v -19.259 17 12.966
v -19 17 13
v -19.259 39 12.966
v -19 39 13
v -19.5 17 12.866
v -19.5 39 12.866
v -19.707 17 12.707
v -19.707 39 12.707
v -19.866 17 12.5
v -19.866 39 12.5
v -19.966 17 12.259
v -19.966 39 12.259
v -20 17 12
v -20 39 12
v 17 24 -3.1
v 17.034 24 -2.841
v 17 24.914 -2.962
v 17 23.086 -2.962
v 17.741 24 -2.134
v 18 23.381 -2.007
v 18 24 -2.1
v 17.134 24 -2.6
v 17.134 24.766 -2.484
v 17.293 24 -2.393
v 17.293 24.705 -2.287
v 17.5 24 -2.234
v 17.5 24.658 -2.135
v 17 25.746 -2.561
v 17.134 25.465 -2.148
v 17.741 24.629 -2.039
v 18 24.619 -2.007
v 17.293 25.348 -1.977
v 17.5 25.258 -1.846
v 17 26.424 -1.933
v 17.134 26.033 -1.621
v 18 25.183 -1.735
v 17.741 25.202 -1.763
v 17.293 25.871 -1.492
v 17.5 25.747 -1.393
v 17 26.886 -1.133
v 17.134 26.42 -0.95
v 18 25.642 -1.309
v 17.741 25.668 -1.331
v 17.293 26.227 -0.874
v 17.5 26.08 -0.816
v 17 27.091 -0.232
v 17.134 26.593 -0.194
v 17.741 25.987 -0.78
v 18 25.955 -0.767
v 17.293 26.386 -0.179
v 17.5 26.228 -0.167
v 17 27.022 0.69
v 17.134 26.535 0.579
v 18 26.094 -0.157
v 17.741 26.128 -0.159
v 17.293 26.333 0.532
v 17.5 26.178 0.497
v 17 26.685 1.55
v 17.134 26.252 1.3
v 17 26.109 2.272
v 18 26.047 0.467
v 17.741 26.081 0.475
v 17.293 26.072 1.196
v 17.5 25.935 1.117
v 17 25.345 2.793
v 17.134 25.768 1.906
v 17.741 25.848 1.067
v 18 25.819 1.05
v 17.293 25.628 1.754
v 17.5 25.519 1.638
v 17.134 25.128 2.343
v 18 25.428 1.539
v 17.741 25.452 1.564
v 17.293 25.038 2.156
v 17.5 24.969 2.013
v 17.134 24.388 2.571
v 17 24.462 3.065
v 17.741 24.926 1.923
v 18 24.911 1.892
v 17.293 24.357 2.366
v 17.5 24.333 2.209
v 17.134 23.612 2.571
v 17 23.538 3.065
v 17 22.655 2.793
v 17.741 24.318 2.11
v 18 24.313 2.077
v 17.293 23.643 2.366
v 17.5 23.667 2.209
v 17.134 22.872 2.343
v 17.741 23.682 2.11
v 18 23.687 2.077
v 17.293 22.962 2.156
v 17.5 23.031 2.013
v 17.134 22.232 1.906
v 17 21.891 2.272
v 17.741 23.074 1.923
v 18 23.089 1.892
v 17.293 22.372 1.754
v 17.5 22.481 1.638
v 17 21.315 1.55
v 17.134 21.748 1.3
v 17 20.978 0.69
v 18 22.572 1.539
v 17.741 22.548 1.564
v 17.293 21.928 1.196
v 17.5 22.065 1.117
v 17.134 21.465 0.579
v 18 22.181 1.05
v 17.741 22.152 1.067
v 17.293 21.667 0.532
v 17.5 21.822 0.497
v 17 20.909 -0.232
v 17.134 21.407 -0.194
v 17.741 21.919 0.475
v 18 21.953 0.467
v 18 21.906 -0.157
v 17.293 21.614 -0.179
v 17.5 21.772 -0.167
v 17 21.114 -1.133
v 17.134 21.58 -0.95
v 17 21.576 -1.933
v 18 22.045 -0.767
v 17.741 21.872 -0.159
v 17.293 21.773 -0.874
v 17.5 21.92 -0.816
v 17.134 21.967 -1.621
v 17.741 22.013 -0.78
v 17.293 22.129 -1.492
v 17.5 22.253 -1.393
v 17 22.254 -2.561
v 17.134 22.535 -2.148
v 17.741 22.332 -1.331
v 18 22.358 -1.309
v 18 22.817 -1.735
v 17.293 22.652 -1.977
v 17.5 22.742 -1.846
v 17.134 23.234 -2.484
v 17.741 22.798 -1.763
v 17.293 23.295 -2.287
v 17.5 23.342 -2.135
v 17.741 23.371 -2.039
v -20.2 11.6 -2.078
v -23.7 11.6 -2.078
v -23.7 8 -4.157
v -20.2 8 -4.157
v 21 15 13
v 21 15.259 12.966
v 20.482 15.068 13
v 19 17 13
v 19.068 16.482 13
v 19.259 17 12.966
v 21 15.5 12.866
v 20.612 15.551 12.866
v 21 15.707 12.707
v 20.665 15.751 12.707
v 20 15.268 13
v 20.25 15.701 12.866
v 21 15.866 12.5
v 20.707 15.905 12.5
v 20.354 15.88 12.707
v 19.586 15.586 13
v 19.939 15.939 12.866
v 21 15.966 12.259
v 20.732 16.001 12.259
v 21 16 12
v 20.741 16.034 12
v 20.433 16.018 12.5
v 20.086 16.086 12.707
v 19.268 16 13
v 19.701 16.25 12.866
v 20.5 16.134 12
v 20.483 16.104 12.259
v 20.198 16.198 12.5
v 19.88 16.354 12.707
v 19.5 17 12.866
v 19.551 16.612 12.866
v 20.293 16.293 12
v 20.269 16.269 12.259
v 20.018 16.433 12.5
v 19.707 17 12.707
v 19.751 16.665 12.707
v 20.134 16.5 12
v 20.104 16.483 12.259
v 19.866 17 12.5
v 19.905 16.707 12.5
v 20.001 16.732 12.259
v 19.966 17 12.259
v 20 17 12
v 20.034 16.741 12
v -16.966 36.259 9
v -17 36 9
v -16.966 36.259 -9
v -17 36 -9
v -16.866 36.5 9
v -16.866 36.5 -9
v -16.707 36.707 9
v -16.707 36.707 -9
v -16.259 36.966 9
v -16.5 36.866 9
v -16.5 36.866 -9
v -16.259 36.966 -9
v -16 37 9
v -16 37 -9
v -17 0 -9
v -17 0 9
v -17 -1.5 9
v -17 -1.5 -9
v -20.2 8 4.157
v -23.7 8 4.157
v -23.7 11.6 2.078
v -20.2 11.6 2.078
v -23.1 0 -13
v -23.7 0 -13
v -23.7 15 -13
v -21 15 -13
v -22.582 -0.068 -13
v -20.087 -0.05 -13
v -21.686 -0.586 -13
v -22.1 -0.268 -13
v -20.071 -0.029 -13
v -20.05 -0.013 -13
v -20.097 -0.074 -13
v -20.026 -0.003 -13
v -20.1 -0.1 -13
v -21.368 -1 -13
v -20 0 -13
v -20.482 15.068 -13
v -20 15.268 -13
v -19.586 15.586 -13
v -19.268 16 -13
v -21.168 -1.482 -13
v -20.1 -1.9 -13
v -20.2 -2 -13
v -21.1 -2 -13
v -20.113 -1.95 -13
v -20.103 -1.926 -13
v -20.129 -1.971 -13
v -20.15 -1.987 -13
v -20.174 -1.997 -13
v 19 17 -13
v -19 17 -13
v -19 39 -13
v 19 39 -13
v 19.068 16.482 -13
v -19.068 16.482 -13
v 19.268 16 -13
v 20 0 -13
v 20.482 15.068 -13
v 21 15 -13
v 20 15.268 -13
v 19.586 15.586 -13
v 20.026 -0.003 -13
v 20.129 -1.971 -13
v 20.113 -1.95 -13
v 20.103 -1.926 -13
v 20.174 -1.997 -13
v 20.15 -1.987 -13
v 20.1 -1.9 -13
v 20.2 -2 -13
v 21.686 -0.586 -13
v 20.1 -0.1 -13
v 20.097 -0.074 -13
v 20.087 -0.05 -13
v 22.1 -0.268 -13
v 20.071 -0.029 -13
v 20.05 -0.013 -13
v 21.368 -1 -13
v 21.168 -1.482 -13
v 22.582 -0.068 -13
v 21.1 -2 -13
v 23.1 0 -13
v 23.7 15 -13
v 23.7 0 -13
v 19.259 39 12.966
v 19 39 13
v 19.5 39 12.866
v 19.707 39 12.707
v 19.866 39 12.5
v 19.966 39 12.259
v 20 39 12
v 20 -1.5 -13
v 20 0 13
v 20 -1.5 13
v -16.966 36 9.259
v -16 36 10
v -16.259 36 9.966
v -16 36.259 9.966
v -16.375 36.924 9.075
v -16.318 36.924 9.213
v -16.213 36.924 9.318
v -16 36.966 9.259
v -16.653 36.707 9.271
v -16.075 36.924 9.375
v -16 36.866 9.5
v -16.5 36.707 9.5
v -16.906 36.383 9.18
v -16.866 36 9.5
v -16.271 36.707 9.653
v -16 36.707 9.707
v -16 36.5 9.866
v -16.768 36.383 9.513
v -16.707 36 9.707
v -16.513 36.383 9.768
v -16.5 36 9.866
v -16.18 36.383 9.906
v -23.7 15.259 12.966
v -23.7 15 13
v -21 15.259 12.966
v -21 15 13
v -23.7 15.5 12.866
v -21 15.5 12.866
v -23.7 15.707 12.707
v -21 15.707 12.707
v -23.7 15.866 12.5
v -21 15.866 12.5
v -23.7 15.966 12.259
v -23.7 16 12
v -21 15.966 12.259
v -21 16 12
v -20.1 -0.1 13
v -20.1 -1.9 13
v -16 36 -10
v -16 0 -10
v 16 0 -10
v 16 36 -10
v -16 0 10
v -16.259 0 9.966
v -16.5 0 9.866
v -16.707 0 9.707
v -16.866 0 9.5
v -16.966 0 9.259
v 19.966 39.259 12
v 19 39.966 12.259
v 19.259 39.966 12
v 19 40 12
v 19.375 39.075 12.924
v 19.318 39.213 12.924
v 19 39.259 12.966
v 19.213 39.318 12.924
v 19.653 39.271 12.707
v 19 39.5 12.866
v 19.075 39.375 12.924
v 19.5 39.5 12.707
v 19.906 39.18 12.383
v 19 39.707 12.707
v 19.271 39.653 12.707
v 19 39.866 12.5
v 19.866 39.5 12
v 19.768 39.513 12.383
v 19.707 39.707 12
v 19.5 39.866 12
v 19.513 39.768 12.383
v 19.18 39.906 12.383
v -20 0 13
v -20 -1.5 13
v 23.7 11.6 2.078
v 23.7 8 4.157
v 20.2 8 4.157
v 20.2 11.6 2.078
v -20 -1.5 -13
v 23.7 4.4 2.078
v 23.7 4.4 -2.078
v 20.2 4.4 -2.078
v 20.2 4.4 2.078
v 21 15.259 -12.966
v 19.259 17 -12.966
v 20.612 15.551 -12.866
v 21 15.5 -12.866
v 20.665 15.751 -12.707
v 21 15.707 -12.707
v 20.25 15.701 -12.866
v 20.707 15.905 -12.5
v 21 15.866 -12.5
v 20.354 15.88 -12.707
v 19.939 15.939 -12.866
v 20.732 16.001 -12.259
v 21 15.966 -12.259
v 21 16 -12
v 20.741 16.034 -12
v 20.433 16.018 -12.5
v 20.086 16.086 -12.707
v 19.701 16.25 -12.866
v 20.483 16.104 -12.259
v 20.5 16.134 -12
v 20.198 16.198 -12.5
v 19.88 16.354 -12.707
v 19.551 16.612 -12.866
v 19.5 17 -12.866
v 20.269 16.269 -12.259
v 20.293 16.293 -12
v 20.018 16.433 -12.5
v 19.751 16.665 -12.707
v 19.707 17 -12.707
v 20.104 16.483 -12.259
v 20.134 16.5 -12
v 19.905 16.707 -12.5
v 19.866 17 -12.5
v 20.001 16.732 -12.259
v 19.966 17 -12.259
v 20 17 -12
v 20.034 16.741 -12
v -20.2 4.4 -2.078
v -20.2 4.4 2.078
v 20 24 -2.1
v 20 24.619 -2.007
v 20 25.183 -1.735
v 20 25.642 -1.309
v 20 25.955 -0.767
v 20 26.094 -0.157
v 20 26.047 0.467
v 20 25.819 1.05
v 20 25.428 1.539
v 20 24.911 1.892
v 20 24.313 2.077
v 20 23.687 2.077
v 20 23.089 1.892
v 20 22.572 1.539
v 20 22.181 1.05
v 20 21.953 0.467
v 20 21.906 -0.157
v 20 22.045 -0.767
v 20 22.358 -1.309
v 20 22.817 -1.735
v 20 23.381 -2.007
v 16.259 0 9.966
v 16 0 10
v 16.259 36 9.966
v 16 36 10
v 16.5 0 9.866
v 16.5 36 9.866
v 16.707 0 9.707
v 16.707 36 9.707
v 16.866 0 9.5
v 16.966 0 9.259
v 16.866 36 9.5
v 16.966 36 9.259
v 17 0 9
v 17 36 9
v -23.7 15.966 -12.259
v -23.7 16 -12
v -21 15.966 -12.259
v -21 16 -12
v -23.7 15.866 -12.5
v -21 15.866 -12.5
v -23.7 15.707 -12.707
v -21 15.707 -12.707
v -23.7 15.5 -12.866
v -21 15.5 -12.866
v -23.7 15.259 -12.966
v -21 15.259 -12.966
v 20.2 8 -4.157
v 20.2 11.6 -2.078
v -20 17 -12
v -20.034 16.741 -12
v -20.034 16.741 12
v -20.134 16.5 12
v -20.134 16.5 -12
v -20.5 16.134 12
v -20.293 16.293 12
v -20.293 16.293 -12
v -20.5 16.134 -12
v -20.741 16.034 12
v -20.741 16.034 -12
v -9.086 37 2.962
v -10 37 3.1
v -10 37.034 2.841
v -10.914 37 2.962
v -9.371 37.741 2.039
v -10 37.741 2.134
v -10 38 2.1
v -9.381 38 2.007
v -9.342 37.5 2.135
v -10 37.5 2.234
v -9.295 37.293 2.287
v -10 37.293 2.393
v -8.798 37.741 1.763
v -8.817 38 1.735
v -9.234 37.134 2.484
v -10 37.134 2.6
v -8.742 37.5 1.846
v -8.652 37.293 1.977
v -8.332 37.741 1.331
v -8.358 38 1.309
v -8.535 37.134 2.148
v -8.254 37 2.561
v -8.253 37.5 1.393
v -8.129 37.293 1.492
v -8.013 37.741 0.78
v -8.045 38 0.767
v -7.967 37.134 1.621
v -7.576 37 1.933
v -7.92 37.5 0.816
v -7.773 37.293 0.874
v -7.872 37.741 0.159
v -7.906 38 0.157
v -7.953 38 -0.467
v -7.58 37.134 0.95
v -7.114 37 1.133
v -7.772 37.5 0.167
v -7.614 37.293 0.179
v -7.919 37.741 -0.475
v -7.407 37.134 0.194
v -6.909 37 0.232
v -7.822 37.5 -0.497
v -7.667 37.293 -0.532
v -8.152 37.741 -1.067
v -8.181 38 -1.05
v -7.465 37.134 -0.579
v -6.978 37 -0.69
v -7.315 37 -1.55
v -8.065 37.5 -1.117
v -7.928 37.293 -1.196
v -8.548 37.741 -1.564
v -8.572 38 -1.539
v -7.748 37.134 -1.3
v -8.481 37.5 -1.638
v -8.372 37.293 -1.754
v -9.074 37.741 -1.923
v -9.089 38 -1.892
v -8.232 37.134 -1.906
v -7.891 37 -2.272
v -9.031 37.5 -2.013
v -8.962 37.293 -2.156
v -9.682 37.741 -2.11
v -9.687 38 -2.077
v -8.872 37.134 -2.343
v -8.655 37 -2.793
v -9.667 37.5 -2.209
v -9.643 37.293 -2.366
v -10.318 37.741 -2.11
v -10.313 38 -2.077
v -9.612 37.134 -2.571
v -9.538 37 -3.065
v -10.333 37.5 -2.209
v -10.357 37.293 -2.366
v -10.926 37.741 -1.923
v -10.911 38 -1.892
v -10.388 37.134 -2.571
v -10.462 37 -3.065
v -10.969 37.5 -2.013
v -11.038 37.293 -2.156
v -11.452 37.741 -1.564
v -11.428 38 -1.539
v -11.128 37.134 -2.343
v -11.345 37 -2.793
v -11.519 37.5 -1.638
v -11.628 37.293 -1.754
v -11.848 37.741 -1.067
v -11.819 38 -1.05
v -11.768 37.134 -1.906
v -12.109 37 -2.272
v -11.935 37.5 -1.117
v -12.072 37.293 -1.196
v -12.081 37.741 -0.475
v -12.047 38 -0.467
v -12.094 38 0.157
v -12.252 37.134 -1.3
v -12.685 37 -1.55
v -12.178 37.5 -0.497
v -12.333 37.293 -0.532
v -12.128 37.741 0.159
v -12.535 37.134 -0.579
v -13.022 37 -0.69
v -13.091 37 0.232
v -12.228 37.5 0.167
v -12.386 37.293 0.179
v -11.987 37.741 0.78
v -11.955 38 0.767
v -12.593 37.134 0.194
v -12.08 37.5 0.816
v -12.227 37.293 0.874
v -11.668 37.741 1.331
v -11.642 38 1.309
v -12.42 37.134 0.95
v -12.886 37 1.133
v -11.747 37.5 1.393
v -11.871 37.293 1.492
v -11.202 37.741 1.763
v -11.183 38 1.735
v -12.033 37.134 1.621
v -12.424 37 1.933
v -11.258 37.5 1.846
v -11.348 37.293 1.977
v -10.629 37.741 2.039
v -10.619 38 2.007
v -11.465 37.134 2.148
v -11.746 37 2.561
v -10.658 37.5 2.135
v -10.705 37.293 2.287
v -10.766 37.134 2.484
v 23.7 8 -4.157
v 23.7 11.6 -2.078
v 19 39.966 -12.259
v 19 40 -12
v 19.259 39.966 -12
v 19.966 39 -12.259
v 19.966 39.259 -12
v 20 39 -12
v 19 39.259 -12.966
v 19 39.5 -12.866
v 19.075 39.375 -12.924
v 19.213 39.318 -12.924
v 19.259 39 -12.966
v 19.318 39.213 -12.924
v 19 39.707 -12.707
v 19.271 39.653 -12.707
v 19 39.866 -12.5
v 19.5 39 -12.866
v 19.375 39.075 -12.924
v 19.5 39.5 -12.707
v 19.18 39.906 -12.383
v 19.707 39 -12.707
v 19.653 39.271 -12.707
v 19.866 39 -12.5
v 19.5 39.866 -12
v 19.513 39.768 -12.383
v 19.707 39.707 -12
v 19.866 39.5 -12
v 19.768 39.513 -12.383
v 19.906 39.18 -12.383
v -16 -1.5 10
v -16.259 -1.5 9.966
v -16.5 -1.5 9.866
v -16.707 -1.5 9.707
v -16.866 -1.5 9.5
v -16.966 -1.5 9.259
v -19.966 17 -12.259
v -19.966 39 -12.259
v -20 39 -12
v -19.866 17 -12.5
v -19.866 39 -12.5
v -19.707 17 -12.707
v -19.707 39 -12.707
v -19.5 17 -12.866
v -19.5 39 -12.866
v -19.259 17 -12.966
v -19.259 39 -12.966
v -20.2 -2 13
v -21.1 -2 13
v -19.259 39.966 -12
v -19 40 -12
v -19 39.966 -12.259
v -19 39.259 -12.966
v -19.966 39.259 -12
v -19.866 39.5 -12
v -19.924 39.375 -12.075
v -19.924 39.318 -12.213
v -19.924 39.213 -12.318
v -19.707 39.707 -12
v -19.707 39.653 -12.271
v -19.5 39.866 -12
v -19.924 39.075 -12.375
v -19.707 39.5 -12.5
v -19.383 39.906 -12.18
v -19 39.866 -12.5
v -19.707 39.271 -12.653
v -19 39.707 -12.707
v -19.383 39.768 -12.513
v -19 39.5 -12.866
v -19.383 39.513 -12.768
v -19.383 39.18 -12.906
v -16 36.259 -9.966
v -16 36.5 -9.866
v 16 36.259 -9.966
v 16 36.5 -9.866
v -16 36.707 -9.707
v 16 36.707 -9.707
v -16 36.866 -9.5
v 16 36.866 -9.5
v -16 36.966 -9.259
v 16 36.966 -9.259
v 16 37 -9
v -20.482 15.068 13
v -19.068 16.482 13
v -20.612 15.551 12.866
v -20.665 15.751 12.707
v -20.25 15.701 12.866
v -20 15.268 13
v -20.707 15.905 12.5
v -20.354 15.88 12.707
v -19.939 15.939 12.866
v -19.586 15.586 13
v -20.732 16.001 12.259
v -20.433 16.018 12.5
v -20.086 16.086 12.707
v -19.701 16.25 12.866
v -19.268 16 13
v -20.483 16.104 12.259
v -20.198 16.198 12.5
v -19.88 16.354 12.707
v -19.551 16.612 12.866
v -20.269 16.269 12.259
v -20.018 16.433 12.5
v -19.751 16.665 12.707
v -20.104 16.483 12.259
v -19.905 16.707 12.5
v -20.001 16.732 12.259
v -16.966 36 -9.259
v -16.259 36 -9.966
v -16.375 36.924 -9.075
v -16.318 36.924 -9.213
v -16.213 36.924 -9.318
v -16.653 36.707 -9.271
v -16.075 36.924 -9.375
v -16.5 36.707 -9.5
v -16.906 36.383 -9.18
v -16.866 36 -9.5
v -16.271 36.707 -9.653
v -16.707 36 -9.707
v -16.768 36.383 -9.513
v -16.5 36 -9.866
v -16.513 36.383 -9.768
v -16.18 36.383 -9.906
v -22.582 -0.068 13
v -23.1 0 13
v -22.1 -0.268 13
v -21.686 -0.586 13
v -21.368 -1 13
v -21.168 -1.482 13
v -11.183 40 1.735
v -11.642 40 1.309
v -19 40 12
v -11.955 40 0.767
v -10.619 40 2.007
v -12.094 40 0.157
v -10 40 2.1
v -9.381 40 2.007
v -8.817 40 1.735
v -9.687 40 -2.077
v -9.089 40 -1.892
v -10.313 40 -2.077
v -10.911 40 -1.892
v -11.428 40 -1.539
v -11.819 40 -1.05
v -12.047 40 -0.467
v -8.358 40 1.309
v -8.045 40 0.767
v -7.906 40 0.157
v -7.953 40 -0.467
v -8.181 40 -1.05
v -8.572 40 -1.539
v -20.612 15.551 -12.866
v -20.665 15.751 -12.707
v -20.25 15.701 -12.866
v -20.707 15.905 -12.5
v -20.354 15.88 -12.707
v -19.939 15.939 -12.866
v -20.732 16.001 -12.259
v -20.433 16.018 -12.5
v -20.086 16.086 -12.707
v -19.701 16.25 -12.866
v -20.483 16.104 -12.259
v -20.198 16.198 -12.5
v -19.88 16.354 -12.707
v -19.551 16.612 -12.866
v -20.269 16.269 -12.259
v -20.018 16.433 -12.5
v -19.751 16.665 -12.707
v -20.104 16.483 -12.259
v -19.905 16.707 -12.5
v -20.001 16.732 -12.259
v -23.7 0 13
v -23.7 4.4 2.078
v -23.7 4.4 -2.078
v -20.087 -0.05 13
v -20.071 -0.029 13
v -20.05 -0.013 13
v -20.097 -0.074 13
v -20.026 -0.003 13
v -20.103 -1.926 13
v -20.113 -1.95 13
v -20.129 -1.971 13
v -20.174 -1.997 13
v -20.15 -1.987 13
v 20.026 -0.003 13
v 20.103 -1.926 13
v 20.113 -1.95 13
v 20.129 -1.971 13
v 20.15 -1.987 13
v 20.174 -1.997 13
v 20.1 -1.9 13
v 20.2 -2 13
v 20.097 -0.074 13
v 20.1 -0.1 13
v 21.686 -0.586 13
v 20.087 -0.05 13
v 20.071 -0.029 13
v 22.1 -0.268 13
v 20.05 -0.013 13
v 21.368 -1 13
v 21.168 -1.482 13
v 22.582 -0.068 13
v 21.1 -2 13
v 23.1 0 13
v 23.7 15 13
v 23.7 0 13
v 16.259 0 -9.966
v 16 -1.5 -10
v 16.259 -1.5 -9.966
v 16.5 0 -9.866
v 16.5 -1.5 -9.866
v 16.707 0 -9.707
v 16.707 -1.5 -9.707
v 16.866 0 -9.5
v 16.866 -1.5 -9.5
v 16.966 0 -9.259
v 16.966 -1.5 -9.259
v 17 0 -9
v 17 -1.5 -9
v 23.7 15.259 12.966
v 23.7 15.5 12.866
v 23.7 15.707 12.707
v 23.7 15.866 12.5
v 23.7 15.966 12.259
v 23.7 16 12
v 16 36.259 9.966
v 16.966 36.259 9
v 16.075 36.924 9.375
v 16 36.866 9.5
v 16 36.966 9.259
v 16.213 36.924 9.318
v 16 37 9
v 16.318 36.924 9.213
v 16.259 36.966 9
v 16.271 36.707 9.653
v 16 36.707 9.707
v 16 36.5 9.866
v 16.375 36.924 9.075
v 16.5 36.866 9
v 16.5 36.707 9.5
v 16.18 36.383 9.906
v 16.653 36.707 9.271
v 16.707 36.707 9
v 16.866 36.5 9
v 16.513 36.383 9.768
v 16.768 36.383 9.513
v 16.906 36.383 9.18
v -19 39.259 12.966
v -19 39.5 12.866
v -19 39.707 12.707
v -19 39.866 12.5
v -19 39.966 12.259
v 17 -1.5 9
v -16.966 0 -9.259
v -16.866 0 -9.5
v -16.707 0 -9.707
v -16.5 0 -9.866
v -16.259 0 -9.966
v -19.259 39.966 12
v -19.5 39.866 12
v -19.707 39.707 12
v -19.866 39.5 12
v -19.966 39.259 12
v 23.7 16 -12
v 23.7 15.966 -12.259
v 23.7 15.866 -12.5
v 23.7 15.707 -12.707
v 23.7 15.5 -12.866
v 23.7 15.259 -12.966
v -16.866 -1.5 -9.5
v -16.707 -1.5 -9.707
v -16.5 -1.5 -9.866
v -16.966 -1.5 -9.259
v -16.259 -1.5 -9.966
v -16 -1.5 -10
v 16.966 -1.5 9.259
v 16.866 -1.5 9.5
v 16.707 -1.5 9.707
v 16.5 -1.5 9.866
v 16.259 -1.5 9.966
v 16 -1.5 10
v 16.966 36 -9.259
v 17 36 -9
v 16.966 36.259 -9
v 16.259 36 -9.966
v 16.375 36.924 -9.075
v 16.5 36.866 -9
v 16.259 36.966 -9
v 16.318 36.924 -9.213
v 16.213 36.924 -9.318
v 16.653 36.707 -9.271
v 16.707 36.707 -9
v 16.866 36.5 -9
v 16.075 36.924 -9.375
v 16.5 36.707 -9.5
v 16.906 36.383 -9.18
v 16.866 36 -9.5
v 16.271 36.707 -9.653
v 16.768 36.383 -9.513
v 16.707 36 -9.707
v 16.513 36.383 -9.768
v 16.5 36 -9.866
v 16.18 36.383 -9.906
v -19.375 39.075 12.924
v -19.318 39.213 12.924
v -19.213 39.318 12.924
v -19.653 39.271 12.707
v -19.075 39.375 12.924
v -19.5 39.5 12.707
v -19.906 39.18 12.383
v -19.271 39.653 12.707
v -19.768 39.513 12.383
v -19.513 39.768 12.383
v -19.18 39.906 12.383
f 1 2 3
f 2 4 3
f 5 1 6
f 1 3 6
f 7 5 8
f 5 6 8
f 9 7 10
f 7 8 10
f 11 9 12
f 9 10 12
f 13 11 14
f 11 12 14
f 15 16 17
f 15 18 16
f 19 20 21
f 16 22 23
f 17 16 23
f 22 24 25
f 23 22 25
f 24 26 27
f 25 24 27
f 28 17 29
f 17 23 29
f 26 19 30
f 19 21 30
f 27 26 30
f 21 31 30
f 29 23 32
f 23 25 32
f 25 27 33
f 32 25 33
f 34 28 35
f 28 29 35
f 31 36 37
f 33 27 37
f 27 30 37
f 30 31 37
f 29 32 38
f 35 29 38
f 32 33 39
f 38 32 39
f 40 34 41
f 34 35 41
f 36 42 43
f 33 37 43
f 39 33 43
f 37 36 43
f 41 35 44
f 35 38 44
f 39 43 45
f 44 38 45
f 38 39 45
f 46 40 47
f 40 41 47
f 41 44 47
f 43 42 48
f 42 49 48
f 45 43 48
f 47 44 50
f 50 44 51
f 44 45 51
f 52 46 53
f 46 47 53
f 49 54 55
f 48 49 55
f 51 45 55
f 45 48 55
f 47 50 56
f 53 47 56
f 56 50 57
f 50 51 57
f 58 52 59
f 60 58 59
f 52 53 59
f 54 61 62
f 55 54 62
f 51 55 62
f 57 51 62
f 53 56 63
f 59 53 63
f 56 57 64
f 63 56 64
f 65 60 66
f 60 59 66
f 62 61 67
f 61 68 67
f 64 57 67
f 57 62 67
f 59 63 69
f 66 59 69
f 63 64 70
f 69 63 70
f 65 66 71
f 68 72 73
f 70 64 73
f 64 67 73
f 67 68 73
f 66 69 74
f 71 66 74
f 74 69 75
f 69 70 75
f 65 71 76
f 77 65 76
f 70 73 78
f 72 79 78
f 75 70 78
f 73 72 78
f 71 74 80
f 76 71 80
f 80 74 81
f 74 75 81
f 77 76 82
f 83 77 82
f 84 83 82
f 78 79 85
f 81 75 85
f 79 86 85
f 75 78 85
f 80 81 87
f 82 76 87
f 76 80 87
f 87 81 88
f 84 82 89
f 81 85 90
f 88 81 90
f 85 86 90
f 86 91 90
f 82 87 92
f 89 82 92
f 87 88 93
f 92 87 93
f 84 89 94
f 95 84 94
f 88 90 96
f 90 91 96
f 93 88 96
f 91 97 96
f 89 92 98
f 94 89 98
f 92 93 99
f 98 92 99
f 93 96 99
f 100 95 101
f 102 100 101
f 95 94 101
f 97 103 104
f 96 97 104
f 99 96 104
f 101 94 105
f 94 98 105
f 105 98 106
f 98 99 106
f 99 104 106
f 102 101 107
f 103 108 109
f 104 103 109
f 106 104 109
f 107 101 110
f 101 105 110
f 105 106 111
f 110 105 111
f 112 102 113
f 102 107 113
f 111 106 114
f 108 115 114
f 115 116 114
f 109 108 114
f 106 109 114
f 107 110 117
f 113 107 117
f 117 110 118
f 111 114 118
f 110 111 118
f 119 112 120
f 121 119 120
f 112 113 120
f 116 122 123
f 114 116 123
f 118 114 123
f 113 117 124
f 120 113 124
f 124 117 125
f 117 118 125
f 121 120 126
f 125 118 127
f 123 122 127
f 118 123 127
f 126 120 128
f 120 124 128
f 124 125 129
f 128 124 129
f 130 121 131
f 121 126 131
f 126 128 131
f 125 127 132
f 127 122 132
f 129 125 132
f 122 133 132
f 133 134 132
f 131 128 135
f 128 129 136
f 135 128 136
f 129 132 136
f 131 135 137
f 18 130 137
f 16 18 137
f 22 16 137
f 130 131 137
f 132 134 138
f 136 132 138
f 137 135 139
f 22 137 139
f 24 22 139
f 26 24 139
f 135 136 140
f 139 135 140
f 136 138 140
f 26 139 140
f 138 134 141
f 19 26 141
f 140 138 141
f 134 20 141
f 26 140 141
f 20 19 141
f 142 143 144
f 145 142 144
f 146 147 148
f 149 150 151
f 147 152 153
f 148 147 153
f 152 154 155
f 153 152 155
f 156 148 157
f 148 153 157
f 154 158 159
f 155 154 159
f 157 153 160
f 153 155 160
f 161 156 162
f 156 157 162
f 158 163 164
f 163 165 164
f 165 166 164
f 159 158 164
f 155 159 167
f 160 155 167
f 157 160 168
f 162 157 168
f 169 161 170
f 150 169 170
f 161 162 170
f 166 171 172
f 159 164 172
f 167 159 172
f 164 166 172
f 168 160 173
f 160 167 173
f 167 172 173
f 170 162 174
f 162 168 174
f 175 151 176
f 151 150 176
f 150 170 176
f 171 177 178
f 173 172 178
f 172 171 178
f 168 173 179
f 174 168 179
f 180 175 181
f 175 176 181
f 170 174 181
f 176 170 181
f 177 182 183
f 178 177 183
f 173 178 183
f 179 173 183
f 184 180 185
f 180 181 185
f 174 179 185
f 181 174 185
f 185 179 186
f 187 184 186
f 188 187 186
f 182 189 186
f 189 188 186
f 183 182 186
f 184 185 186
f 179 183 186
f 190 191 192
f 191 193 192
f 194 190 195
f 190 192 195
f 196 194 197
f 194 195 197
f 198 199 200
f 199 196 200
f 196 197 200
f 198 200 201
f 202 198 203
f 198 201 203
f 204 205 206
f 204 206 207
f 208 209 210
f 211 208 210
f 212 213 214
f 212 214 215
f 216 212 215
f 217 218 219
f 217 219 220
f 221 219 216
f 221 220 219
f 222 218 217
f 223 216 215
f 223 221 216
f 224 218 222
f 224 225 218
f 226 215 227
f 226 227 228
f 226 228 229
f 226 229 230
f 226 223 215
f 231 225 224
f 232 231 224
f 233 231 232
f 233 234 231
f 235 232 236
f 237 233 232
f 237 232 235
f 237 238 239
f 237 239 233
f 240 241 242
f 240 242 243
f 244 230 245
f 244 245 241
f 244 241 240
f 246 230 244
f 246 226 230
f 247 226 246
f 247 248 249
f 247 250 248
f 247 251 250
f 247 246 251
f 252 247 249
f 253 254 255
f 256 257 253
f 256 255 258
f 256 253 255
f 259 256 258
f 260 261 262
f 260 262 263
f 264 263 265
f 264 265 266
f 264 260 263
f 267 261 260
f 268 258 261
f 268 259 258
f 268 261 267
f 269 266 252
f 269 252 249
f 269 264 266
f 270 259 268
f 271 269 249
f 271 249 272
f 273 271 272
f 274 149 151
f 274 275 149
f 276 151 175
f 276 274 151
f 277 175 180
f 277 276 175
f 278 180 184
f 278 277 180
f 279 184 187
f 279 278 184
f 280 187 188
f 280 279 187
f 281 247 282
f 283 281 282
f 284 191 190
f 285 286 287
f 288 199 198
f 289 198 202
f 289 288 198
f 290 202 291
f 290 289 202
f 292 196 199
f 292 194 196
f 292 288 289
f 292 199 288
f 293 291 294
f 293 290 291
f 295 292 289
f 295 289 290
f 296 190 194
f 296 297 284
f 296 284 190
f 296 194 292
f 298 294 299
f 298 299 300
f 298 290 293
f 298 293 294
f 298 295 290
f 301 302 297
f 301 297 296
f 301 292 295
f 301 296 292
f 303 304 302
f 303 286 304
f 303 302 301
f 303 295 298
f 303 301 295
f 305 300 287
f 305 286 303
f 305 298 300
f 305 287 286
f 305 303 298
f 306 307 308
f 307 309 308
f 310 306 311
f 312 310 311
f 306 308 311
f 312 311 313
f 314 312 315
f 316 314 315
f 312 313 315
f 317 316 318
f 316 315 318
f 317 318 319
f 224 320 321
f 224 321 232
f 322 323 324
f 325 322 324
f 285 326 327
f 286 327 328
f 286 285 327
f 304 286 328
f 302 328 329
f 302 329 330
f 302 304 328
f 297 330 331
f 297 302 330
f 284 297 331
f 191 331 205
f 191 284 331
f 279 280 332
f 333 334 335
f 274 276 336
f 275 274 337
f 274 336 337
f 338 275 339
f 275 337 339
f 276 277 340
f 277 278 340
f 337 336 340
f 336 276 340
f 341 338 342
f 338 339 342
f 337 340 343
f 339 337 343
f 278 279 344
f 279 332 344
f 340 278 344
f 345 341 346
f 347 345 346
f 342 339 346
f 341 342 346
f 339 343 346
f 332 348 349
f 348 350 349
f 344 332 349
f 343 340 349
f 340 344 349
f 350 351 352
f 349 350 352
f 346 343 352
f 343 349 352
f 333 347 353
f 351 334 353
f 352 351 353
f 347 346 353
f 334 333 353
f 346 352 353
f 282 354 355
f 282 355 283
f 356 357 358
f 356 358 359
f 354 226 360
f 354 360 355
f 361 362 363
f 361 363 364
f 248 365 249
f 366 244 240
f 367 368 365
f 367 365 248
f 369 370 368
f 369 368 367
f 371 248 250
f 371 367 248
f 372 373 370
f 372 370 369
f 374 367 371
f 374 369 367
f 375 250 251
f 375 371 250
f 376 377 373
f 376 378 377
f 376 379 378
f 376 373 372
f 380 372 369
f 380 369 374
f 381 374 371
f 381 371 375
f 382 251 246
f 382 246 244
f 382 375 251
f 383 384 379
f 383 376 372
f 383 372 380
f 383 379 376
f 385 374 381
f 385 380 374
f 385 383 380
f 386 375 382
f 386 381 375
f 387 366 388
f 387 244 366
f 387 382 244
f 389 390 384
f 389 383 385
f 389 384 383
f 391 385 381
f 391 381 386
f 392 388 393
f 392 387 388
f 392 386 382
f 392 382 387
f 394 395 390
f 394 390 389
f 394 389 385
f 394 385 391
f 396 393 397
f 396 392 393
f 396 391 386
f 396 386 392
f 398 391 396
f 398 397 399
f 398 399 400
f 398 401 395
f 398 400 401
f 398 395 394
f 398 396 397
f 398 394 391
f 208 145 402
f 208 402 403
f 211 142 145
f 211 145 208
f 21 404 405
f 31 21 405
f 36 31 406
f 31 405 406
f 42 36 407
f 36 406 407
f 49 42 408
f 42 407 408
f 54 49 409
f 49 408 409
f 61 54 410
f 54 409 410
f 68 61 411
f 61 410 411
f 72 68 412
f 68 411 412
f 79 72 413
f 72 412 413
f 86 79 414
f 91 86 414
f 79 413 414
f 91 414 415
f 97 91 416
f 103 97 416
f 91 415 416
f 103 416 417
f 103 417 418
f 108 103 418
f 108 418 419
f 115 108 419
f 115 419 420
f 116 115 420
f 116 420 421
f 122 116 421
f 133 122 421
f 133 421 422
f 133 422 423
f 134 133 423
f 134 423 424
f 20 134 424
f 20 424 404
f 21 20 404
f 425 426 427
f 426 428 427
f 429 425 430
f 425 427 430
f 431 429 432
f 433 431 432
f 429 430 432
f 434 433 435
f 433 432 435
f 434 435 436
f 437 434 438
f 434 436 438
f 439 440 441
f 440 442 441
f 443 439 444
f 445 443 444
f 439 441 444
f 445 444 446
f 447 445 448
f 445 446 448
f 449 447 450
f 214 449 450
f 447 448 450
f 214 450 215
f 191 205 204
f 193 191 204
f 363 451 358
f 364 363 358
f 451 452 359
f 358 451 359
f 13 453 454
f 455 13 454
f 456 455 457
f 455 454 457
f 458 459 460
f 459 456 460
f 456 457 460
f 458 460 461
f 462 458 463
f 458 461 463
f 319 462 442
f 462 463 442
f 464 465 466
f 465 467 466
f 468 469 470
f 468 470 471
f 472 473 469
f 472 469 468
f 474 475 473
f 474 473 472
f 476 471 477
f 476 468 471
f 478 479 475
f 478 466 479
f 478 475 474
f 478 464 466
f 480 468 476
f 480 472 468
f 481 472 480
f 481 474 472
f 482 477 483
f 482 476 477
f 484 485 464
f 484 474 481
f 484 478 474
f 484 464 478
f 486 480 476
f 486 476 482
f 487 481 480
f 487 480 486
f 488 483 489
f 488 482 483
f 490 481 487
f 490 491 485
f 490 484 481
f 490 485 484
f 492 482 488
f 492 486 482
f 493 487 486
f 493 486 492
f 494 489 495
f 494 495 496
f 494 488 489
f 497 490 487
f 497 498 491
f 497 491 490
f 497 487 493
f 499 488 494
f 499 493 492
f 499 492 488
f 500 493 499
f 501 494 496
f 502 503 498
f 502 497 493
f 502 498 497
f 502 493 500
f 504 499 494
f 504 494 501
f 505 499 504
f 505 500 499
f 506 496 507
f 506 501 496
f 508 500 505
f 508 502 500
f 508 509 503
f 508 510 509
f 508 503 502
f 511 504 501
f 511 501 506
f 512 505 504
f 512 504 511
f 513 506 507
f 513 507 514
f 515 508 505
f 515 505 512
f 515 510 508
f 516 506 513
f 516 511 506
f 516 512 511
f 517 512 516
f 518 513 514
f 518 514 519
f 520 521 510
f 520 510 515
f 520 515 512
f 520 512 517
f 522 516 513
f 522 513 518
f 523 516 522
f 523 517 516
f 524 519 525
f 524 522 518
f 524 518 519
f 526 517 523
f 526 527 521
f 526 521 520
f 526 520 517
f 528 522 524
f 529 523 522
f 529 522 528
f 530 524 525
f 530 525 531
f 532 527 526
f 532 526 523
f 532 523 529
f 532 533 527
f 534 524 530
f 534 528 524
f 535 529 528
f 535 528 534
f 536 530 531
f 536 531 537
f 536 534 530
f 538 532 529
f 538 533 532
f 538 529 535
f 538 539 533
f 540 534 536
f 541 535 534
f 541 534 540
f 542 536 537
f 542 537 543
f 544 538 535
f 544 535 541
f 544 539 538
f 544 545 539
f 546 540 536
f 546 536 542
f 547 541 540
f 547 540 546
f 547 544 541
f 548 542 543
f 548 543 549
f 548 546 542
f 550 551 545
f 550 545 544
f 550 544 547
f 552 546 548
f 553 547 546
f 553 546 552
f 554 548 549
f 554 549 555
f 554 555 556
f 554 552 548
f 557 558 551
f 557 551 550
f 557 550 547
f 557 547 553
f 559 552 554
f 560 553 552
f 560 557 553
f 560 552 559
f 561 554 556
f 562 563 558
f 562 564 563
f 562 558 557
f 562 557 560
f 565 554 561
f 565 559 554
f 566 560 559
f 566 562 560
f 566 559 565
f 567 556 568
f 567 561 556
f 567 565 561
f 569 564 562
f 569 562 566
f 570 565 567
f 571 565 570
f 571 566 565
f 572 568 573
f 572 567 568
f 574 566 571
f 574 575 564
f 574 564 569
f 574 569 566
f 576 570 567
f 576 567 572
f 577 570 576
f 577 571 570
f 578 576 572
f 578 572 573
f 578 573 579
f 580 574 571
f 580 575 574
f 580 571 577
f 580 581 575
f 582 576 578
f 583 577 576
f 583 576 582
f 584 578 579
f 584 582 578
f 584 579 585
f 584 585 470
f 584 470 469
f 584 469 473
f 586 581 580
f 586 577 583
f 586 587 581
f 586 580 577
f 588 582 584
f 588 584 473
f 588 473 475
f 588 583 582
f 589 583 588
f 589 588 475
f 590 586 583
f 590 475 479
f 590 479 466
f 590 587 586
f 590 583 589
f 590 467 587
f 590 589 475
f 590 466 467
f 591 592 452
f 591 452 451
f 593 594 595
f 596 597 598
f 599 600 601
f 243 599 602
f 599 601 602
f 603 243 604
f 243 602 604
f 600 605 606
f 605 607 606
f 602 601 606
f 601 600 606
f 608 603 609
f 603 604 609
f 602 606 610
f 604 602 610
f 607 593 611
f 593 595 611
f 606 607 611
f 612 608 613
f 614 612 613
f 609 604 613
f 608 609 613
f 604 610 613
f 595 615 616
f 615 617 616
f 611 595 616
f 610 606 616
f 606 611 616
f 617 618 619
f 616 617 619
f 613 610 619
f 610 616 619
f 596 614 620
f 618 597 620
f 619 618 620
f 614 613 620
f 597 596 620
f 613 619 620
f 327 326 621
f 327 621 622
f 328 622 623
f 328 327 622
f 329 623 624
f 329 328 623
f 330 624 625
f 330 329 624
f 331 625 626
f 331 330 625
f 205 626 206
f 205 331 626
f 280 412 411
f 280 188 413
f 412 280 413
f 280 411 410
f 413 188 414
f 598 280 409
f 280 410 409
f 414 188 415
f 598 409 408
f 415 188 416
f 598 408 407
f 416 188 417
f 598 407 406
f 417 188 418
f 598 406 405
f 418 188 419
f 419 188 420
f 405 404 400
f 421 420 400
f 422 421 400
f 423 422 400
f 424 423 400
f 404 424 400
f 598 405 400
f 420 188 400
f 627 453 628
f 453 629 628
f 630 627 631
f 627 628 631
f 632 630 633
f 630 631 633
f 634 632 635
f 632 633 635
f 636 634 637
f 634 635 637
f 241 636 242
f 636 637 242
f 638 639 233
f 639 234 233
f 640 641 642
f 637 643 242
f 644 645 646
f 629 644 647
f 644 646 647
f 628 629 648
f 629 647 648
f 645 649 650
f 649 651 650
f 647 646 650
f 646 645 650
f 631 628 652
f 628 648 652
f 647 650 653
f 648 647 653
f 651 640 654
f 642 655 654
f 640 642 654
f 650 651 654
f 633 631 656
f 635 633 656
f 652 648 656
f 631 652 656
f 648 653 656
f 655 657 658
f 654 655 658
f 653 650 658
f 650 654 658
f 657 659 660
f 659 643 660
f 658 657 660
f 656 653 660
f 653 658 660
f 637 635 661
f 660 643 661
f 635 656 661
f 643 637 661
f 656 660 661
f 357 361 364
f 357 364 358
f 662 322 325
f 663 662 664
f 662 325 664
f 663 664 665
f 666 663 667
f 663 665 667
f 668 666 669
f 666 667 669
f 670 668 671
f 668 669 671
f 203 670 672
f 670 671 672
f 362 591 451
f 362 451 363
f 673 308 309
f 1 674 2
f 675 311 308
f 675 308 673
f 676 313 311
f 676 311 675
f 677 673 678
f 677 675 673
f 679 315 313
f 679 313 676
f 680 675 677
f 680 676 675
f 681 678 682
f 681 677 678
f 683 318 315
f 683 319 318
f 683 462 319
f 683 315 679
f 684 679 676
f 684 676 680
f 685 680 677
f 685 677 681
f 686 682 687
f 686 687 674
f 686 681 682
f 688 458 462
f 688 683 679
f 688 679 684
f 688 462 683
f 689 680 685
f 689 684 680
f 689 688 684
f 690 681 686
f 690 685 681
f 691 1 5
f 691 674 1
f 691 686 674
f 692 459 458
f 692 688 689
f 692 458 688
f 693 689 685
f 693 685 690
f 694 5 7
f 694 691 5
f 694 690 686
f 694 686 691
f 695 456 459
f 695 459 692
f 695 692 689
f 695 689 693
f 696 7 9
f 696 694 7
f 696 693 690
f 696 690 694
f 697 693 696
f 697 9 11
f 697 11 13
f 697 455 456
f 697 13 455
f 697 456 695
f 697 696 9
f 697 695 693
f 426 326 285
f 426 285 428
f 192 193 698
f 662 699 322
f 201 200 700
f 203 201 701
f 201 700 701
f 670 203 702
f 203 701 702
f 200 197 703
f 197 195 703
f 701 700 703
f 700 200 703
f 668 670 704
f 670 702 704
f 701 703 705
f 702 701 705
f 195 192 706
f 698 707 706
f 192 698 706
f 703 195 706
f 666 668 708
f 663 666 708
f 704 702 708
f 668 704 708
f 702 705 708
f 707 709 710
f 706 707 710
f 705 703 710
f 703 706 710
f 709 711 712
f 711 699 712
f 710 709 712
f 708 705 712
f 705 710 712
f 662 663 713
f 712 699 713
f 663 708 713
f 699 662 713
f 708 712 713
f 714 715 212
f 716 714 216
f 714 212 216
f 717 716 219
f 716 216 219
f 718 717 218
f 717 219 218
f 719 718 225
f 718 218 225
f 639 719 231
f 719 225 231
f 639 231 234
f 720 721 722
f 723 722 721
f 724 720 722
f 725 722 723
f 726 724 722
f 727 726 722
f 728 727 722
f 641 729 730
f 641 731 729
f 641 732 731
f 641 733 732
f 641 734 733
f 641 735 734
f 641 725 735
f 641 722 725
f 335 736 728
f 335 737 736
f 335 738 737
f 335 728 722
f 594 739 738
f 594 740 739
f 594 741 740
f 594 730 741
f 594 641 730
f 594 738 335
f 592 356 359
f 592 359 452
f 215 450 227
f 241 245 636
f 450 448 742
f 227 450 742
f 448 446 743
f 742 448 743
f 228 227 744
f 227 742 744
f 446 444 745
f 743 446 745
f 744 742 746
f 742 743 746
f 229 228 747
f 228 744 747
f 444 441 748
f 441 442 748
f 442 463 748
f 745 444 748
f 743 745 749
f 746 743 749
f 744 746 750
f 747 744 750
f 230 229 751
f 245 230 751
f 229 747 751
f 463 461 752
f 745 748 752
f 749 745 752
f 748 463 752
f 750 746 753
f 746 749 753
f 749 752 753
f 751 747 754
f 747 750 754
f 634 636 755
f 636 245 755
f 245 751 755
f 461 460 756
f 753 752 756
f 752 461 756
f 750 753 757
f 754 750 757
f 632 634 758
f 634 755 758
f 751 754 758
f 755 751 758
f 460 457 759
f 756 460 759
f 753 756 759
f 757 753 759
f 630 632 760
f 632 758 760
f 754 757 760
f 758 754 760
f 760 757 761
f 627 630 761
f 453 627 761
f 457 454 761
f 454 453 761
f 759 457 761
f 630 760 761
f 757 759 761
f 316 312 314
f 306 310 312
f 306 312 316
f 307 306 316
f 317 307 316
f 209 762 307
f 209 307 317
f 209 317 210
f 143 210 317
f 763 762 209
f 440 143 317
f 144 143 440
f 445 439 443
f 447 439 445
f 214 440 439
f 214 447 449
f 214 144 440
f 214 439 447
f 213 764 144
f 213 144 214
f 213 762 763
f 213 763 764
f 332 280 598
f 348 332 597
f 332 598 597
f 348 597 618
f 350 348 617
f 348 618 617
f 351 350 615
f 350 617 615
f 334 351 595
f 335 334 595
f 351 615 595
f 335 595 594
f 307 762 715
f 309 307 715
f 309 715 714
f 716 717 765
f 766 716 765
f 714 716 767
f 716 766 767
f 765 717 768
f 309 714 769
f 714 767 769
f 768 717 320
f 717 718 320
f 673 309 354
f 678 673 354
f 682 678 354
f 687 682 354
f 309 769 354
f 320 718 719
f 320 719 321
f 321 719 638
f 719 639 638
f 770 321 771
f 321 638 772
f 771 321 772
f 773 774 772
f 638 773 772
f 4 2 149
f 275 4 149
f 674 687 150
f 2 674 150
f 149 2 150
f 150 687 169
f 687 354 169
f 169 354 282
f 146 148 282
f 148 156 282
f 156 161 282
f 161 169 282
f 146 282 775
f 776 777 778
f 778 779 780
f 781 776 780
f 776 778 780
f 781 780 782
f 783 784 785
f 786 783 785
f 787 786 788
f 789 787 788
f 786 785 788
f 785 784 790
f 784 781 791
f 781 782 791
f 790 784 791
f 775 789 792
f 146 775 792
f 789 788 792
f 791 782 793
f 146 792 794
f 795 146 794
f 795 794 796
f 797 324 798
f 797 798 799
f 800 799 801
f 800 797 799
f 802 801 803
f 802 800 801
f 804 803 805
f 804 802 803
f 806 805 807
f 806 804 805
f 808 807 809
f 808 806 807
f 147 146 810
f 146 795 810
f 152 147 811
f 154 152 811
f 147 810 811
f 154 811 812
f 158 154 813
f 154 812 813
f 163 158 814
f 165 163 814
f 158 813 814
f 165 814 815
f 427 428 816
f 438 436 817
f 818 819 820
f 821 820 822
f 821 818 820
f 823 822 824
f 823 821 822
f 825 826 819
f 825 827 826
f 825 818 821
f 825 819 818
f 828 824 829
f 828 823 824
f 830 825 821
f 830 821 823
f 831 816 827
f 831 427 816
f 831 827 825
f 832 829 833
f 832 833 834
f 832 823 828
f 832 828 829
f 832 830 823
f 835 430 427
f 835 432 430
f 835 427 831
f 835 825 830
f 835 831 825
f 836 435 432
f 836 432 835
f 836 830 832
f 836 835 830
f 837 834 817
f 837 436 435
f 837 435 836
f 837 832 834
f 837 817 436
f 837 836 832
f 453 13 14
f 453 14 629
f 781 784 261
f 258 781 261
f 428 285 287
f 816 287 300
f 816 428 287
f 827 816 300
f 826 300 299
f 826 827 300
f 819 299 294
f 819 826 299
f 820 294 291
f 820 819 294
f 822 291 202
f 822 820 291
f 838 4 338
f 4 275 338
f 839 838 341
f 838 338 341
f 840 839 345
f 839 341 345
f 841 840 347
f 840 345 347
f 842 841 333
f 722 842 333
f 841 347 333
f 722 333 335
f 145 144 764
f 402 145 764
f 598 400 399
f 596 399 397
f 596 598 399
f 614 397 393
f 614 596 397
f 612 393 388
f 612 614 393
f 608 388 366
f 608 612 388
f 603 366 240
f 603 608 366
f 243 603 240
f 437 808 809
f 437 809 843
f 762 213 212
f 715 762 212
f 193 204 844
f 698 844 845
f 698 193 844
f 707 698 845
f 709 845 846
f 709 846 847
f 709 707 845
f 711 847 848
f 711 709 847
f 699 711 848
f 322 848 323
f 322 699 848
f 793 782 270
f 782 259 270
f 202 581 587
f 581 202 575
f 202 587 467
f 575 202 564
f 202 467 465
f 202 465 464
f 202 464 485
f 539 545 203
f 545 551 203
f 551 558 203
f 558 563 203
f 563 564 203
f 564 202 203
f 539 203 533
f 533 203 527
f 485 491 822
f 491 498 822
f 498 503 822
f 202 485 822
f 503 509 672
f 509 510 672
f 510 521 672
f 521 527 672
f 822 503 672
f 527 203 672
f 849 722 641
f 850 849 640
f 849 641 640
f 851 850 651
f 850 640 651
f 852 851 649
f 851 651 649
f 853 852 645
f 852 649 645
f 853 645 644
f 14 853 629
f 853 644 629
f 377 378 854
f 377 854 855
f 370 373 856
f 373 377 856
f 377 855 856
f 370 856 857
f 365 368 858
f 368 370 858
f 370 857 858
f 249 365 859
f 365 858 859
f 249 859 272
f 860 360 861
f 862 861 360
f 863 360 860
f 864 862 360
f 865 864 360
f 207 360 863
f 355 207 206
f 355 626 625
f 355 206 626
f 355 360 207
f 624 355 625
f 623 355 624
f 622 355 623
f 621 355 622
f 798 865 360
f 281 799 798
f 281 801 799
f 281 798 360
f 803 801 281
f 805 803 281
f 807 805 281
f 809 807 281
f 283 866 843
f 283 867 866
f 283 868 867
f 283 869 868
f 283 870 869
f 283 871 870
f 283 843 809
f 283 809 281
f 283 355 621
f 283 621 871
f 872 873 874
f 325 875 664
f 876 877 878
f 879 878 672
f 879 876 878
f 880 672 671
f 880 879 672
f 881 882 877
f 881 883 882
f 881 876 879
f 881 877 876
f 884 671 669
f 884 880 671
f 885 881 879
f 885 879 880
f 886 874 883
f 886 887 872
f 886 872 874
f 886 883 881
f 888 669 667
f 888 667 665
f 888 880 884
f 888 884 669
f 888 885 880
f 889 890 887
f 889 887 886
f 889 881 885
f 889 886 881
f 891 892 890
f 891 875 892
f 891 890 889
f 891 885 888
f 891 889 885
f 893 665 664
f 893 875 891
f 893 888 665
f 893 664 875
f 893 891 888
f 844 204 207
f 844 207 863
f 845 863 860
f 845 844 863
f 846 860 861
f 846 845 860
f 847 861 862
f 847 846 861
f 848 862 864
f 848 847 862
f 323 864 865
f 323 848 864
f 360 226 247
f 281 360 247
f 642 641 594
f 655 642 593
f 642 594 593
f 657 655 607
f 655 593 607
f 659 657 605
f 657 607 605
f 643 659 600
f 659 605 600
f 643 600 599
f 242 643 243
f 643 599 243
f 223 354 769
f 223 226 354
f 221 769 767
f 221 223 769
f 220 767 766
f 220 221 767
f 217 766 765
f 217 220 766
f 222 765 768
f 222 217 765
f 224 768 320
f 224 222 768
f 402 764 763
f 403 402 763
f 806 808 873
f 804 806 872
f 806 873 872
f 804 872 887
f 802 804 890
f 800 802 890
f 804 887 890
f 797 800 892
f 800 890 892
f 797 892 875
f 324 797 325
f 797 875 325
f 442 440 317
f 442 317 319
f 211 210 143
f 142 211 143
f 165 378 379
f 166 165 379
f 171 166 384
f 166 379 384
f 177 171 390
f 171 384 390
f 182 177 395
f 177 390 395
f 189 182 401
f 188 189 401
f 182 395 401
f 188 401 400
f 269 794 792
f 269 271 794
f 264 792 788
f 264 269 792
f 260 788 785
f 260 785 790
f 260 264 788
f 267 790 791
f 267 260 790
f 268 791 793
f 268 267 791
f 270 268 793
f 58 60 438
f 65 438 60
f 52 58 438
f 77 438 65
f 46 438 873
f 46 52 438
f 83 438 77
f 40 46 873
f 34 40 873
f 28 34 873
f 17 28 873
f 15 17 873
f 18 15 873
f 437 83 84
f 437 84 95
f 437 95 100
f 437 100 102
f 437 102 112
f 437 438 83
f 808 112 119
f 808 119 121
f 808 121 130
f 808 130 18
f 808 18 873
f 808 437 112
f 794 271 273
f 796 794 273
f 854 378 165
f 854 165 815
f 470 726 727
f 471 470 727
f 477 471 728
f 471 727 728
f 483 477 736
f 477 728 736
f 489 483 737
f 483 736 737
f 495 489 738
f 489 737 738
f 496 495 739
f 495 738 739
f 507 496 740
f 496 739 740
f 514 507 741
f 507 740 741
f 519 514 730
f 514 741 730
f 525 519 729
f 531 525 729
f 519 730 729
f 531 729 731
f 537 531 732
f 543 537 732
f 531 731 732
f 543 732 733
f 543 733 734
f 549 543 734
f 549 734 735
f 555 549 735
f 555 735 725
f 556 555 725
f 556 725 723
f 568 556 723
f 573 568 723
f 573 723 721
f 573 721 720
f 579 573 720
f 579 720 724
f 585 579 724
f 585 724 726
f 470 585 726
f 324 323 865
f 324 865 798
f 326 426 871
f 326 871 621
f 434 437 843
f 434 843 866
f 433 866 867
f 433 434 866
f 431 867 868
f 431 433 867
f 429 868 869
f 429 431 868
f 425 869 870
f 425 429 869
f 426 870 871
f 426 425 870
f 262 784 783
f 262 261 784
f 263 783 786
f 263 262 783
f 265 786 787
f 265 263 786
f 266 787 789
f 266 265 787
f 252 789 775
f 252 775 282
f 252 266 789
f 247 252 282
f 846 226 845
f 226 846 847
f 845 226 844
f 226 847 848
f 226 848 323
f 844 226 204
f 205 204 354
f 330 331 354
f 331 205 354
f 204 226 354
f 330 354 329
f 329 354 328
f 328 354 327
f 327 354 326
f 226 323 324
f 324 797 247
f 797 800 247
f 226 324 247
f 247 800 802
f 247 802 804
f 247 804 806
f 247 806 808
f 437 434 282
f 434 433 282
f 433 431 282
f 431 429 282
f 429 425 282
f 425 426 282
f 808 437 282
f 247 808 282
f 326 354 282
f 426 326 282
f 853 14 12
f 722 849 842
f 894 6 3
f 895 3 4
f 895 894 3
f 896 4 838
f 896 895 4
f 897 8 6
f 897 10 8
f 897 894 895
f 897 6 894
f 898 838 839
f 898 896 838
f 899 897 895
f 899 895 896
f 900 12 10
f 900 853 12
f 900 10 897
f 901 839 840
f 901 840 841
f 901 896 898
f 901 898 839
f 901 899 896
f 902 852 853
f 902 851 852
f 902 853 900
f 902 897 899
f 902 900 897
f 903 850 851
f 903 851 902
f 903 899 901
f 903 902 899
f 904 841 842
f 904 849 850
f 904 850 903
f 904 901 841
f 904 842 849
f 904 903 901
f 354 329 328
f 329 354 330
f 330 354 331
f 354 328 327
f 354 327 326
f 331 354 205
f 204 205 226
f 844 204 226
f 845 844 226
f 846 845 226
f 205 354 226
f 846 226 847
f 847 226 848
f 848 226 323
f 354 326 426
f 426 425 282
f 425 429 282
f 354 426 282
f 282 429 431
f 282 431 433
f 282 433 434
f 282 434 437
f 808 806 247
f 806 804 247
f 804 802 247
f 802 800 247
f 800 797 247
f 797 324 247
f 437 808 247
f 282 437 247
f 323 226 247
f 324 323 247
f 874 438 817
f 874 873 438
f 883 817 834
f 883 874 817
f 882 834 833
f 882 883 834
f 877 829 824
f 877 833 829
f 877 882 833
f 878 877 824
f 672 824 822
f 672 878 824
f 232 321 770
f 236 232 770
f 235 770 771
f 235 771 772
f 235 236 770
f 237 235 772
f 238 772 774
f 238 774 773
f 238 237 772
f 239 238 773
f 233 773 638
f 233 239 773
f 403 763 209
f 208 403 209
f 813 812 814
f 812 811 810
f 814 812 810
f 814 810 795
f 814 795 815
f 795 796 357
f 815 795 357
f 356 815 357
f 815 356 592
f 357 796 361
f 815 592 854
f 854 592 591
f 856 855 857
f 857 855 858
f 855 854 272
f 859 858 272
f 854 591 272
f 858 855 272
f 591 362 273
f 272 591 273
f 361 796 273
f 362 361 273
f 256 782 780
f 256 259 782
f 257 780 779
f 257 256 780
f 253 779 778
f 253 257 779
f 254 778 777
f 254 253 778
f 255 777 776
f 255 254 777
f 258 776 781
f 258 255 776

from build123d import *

# Parameters (mm, degrees)
SKETCH1_W               = 40
SKETCH1_H               = 26
BODY_DEPTH              = 40
SKETCH2_W               = 3.7
SKETCH2_H               = 26
EXTENSION_DEPTH         = 16
SKETCH5_W               = 34
SKETCH5_H               = 20
CAVITY_DEPTH            = 37
TOP_HOLE_REACH          = 50.277
SKETCH6_R               = 2.1
SIDE_HOLE_REACH         = 62.652
SKETCH7_R               = 2.1
SKETCH3_W               = 1
SKETCH3_H               = 26
LEGS_DEPTH              = 2
MOUNT_COUNTERBORE_DEPTH = 3.5
F_2MM_LEG_FILLET_R      = 2
F_0_1MM_LEG_FILLET_R    = 0.1
OUTER_BOUNDARY_FILLET_R = 1
INNER_BOUNDARY_FILLET_R = 1
SKETCH8_W               = 40
SKETCH8_H               = 26
BOSS_EXTRUDE1_DEPTH     = 1.5


with BuildPart() as part:
    # Sketch1 → Body (new body)
    with BuildSketch(Plane(origin=(0, 0, 0), x_dir=(1, 0, 0), z_dir=(0, 1, 0))):
        Rectangle(SKETCH1_W, SKETCH1_H)
    extrude(amount=BODY_DEPTH)

    # Sketch2 → Extension (add)
    with BuildSketch(Plane(origin=(0, 0, 0), x_dir=(1, 0, 0), z_dir=(0, 1, 0))):
        with Locations((-21.85, 0)):
            Rectangle(SKETCH2_W, SKETCH2_H)
        with Locations((21.85, 0)):
            Rectangle(SKETCH2_W, SKETCH2_H)
    extrude(amount=EXTENSION_DEPTH)

    # Sketch5 → Cavity (cut)
    with BuildSketch(Plane(origin=(0, 0, 0), x_dir=(1, 0, 0), z_dir=(0, 1, 0))):
        Rectangle(SKETCH5_W, SKETCH5_H)
    extrude(amount=CAVITY_DEPTH, mode=Mode.SUBTRACT)

    # Sketch6 → Top Hole (cut, up to next)
    with BuildSketch(Plane(origin=(0, 40, 0), x_dir=(1, 0, 0), z_dir=(0, 1, 0)), mode=Mode.PRIVATE) as top_hole_sk1:
        with Locations(Location((-10, 0, 0), (0, 0, 270))):
            Circle(SKETCH6_R)
    top_hole_tool1 = extrude(top_hole_sk1.sketch, amount=-TOP_HOLE_REACH, mode=Mode.PRIVATE) & part.part
    add(top_hole_tool1.solids().sort_by_distance((-10, 40, 0))[0], mode=Mode.SUBTRACT)

    # Sketch7 → Side Hole (cut, up to next)
    with BuildSketch(Plane(origin=(20, 0, 0), x_dir=(0, 0, -1), z_dir=(1, 0, 0)), mode=Mode.PRIVATE) as side_hole_sk1:
        with Locations((0, 24)):
            Circle(SKETCH7_R)
    side_hole_tool1 = extrude(side_hole_sk1.sketch, amount=-SIDE_HOLE_REACH, mode=Mode.PRIVATE) & part.part
    add(side_hole_tool1.solids().sort_by_distance((20, 24, 0))[0], mode=Mode.SUBTRACT)

    # Sketch3 → Legs (add)
    with BuildSketch(Plane(origin=(0, 0, 0), x_dir=(1, 0, 0), z_dir=(0, 1, 0))):
        with Locations((-20.6, 0)):
            Rectangle(SKETCH3_W, SKETCH3_H)
        with Locations((20.6, 0)):
            Rectangle(SKETCH3_W, SKETCH3_H)
    extrude(amount=-LEGS_DEPTH)

    # Sketch4 → Mount Counterbore (cut)
    with BuildSketch(Plane.ZY.offset(23.7)):
        Polygon((2.078460969, 11.6), (-2.078460969, 11.6), (-4.156921938, 8), (-2.078460969, 4.4), (2.078460969, 4.4), (4.156921938, 8), align=None)
    mount_counterbore = extrude(amount=-MOUNT_COUNTERBORE_DEPTH, mode=Mode.SUBTRACT)

    # Mount Counterbore Mirror: Mount Counterbore across plane
    add(mount_counterbore.mirror(Plane(origin=(0, 0, 0), x_dir=(0, 0, 1), z_dir=(1, 0, 0))), mode=Mode.SUBTRACT)

    # 2mm Leg Fillet
    f_2mm_leg_fillet_edges = [part.edges().sort_by_distance(p)[0] for p in [
        (21.1, 0, 0),
        (-21.1, 0, 0),
    ]]
    fillet(f_2mm_leg_fillet_edges, radius=F_2MM_LEG_FILLET_R - 0.0001)  # a hair under: the kernel refuses the full size

    # 0.1mm Leg Fillet
    f_0_1mm_leg_fillet_edges = [part.edges().sort_by_distance(p)[0] for p in [
        (-20.1, -2, 0),
        (-20.1, 0, 0),
        (20.1, -2, 0),
        (20.1, 0, 0),
    ]]
    fillet(f_0_1mm_leg_fillet_edges, radius=F_0_1MM_LEG_FILLET_R)

    # Outer Boundary Fillet
    outer_boundary_fillet_edges = [part.edges().sort_by_distance(p)[0] for p in [
        (20, 40, 0),
        (-20, 16, 0),
        (-21.85, 16, -13),
        (0, 40, -13),
        (-21.85, 16, 13),
        (20, 16, 0),
        (21.85, 16, 13),
        (21.85, 16, -13),
        (-20, 40, 0),
        (-20, 28, -13),
        (20, 28, -13),
        (20, 28, 13),
        (-20, 28, 13),
        (0, 40, 13),
    ]]
    fillet(outer_boundary_fillet_edges, radius=OUTER_BOUNDARY_FILLET_R)

    # Inner Boundary Fillet
    inner_boundary_fillet_edges = [part.edges().sort_by_distance(p)[0] for p in [
        (-17, 18.5, -10),
        (-17, 18.5, 10),
        (17, 18.5, 10),
        (17, 18.5, -10),
        (-17, 37, 0),
        (0, 37, 10),
        (17, 37, 0),
        (0, 37, -10),
        (-10, 37, -2.1),
        (17, 24, 2.1),
    ]]
    fillet(inner_boundary_fillet_edges, radius=INNER_BOUNDARY_FILLET_R)


with BuildPart() as body_2:
    # Sketch8 → Boss-Extrude1 (new body)
    with BuildSketch(Plane.XZ):
        Rectangle(SKETCH8_W, SKETCH8_H)
        with BuildLine():
            Line((-16, -10), (16, -10))
            ThreePointArc((16, -10), (16.707106781, -9.707106781), (17, -9))
            Line((17, -9), (17, 9))
            ThreePointArc((17, 9), (16.707106781, 9.707106781), (16, 10))
            Line((16, 10), (-16, 10))
            ThreePointArc((-16, 10), (-16.707106781, 9.707106781), (-17, 9))
            Line((-17, 9), (-17, -9))
            ThreePointArc((-17, -9), (-16.707106781, -9.707106781), (-16, -10))
        make_face(mode=Mode.SUBTRACT)
    extrude(amount=BOSS_EXTRUDE1_DEPTH)


solid = Compound([part.part, body_2.part])
